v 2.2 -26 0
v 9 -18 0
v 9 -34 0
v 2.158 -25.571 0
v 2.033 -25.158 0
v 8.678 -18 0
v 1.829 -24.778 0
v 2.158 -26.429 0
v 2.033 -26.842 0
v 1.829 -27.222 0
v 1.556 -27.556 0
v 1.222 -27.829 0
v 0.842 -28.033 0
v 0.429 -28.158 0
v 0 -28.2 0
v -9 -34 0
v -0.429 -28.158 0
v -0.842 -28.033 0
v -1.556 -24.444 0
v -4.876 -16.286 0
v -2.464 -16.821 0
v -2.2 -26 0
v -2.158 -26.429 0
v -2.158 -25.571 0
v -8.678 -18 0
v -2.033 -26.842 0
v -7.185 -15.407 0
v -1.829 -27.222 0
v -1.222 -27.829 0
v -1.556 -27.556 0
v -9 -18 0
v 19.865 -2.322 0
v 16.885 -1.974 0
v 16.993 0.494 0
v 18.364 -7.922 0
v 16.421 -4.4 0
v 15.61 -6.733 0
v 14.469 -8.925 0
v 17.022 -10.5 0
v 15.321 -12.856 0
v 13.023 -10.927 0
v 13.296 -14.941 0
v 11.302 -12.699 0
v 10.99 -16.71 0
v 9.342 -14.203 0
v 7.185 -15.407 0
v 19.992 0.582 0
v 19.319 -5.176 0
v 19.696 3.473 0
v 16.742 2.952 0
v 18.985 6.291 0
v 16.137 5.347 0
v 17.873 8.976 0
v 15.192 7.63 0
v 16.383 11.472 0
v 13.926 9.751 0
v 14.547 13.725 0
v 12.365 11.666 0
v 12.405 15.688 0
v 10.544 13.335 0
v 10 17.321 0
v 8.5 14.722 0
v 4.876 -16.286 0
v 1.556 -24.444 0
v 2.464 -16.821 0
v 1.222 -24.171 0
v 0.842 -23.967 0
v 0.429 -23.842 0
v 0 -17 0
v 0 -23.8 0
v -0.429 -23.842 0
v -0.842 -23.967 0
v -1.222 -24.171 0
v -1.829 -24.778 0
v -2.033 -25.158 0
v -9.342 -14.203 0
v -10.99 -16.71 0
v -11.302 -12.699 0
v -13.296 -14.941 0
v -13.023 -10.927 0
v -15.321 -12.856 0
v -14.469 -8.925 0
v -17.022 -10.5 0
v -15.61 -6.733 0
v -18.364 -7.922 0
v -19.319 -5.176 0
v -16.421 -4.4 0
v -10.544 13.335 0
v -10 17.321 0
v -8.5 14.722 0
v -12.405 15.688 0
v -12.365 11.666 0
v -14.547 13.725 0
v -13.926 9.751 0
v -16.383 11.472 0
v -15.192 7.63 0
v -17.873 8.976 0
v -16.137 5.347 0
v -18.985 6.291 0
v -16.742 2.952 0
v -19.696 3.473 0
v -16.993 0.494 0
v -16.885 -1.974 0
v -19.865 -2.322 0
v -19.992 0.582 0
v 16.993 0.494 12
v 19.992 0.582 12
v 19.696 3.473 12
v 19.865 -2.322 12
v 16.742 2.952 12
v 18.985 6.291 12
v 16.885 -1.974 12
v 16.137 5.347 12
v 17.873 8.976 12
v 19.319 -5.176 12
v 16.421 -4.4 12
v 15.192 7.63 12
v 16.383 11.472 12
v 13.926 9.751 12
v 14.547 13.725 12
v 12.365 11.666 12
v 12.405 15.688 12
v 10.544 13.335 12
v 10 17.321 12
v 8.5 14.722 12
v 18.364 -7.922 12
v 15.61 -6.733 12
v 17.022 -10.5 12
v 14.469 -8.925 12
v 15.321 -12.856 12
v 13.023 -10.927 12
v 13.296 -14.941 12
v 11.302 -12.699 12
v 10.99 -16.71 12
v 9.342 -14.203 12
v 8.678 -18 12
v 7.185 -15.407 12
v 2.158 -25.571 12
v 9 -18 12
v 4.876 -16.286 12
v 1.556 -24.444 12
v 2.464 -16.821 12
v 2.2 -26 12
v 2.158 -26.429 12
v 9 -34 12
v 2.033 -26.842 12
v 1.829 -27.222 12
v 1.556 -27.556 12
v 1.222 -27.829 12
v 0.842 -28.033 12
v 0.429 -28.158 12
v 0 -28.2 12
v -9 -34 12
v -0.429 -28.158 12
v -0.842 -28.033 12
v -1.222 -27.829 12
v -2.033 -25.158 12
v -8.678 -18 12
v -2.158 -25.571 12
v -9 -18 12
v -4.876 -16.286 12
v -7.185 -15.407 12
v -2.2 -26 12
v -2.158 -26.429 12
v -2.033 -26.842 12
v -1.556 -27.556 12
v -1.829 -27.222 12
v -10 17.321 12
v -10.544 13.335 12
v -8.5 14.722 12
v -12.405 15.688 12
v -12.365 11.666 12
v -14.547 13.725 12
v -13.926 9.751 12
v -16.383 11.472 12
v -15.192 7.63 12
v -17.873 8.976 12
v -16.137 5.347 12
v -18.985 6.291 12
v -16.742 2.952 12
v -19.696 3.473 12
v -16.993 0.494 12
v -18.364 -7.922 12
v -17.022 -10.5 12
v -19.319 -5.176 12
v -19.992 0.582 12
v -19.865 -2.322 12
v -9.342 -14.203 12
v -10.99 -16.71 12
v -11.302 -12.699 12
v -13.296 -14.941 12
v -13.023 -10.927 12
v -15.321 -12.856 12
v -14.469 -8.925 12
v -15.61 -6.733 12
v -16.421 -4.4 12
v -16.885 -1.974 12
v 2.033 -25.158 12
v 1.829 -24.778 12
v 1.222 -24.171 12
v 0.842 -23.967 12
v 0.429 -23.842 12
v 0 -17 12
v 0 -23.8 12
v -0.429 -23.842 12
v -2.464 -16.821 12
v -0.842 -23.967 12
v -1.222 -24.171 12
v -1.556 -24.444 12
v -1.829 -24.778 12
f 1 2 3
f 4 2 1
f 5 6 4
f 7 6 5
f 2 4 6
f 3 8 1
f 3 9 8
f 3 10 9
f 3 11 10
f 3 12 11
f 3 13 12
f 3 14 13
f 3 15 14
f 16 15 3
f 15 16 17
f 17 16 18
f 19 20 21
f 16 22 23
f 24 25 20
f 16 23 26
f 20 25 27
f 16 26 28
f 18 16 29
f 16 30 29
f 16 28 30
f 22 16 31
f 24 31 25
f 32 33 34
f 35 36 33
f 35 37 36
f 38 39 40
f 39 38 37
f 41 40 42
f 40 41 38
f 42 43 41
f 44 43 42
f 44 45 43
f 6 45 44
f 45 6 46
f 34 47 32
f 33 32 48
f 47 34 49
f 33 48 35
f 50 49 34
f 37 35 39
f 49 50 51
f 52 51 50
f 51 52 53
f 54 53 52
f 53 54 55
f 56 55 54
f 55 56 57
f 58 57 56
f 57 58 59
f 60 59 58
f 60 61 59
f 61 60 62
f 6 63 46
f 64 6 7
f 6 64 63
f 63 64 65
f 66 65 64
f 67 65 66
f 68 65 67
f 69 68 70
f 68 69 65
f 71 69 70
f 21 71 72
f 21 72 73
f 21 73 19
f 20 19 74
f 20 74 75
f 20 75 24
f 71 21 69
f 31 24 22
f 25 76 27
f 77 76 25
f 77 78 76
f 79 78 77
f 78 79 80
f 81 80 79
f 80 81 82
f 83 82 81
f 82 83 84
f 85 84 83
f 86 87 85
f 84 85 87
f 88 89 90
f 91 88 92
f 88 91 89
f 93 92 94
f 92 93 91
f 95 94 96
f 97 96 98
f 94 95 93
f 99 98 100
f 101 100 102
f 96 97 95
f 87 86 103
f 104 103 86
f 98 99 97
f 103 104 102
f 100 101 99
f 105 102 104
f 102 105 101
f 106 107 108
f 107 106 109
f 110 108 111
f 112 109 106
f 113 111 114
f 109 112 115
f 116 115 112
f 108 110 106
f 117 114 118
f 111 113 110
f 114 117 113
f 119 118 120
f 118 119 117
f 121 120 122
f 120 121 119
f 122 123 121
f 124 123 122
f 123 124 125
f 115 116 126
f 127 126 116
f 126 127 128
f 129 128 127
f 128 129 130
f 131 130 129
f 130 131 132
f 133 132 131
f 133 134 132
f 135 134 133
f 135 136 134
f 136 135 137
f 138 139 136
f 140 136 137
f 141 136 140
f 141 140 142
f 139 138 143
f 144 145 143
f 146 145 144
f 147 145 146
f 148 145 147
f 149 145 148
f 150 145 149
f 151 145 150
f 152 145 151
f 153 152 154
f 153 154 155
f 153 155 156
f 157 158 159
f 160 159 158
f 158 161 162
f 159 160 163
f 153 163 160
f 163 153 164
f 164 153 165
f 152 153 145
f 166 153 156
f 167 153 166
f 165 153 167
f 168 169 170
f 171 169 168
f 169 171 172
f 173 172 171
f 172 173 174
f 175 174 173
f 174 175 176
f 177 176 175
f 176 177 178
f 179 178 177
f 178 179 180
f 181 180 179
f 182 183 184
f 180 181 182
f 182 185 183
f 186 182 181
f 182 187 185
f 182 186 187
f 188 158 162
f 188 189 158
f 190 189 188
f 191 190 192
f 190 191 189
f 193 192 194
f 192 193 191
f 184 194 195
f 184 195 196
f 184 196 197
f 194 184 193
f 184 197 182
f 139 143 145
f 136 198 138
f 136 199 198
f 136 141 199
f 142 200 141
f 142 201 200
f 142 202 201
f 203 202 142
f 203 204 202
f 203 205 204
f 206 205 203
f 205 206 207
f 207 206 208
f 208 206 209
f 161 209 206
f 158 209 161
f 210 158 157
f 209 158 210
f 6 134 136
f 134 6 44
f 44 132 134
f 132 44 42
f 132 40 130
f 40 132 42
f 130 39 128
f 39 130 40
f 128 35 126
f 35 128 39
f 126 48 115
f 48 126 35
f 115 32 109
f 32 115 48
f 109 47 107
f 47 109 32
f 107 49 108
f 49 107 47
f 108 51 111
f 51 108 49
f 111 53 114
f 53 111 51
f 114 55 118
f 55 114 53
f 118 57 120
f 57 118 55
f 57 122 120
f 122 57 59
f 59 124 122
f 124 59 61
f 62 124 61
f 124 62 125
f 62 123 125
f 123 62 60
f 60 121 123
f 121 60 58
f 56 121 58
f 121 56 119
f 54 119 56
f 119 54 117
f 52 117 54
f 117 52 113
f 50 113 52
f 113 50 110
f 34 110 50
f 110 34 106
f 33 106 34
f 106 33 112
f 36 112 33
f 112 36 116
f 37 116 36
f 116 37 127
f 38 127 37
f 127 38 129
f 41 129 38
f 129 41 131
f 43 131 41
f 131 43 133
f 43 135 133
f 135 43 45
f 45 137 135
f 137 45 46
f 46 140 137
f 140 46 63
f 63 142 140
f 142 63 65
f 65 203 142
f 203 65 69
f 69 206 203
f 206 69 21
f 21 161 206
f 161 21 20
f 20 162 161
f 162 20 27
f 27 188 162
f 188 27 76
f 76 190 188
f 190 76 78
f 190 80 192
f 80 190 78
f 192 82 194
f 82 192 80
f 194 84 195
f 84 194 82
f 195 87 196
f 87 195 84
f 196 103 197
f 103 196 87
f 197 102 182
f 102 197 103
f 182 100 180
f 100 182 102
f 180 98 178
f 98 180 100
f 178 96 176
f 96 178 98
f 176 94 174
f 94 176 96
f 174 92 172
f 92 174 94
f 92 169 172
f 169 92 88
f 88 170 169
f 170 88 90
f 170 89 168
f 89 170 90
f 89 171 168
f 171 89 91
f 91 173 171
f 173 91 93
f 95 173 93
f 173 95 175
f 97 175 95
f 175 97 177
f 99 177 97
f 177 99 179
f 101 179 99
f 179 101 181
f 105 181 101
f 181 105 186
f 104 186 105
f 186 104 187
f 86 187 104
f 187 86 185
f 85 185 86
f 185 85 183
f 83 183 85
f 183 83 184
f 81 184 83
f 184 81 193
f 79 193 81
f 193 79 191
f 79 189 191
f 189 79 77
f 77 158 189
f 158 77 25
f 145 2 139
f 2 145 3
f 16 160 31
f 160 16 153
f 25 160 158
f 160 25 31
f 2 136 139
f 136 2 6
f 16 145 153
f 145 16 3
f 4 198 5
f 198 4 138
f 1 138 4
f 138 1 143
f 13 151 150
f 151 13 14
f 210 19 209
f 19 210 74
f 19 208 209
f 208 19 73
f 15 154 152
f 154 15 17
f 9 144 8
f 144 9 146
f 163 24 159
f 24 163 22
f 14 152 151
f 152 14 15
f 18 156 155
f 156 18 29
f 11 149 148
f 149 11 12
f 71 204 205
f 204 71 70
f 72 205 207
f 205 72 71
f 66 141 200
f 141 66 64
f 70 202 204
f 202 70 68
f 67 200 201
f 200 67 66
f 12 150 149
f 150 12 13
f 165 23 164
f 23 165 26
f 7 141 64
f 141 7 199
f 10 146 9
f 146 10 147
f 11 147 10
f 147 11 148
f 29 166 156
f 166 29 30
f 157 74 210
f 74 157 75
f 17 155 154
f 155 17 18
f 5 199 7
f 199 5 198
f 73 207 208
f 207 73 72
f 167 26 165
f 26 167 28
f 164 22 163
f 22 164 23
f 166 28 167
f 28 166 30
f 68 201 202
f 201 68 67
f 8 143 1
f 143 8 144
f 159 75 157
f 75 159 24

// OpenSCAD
$fn = 32;

// ----------------------------------------------------------------------
// Spring clip: 40 mm outside, 3 mm band, 60 degree opening
// ----------------------------------------------------------------------

// --- parameters (mm) ---
outer_r = 20;             // clip outside radius
inner_r = 17;             // clip bore radius
band = 3;                 // band thickness
clip_w = 12;              // clip width
opening = 60;             // opening angle
tab_w = 18;               // tab width
tab_len = 14;             // tab length past the clip
tab_hole = 4.4;           // tab fixing hole

clip_profile = [[-10, 17.321], [-12.405, 15.688], [-14.547, 13.725], [-16.383, 11.472], [-17.873, 8.976], [-18.985, 6.291], [-19.696, 3.473], [-19.992, 0.582], [-19.865, -2.322], [-19.319, -5.176], [-18.364, -7.922], [-17.022, -10.5], [-15.321, -12.856], [-13.296, -14.941], [-10.99, -16.71], [-8.452, -18.126], [-5.736, -19.16], [-2.899, -19.789], [0, -20], [2.899, -19.789], [5.736, -19.16], [8.452, -18.126], [10.99, -16.71], [13.296, -14.941], [15.321, -12.856], [17.022, -10.5], [18.364, -7.922], [19.319, -5.176], [19.865, -2.322], [19.992, 0.582], [19.696, 3.473], [18.985, 6.291], [17.873, 8.976], [16.383, 11.472], [14.547, 13.725], [12.405, 15.688], [10, 17.321], [8.5, 14.722], [10.544, 13.335], [12.365, 11.666], [13.926, 9.751], [15.192, 7.63], [16.137, 5.347], [16.742, 2.952], [16.993, 0.494], [16.885, -1.974], [16.421, -4.4], [15.61, -6.733], [14.469, -8.925], [13.023, -10.927], [11.302, -12.699], [9.342, -14.203], [7.185, -15.407], [4.876, -16.286], [2.464, -16.821], [0, -17], [-2.464, -16.821], [-4.876, -16.286], [-7.185, -15.407], [-9.342, -14.203], [-11.302, -12.699], [-13.023, -10.927], [-14.469, -8.925], [-15.61, -6.733], [-16.421, -4.4], [-16.885, -1.974], [-16.993, 0.494], [-16.742, 2.952], [-16.137, 5.347], [-15.192, 7.63], [-13.926, 9.751], [-12.365, 11.666], [-10.544, 13.335], [-8.5, 14.722]];

difference() {
  union() {
    linear_extrude(height = clip_w) polygon(clip_profile);
    /* mounting tab, sunk 2 mm into the band */
    translate([-9, -34, 0]) cube([tab_w, 16, clip_w]);
  }
  translate([0, -26, -2.5]) cylinder(h = clip_w + 5, d = tab_hole);
}
